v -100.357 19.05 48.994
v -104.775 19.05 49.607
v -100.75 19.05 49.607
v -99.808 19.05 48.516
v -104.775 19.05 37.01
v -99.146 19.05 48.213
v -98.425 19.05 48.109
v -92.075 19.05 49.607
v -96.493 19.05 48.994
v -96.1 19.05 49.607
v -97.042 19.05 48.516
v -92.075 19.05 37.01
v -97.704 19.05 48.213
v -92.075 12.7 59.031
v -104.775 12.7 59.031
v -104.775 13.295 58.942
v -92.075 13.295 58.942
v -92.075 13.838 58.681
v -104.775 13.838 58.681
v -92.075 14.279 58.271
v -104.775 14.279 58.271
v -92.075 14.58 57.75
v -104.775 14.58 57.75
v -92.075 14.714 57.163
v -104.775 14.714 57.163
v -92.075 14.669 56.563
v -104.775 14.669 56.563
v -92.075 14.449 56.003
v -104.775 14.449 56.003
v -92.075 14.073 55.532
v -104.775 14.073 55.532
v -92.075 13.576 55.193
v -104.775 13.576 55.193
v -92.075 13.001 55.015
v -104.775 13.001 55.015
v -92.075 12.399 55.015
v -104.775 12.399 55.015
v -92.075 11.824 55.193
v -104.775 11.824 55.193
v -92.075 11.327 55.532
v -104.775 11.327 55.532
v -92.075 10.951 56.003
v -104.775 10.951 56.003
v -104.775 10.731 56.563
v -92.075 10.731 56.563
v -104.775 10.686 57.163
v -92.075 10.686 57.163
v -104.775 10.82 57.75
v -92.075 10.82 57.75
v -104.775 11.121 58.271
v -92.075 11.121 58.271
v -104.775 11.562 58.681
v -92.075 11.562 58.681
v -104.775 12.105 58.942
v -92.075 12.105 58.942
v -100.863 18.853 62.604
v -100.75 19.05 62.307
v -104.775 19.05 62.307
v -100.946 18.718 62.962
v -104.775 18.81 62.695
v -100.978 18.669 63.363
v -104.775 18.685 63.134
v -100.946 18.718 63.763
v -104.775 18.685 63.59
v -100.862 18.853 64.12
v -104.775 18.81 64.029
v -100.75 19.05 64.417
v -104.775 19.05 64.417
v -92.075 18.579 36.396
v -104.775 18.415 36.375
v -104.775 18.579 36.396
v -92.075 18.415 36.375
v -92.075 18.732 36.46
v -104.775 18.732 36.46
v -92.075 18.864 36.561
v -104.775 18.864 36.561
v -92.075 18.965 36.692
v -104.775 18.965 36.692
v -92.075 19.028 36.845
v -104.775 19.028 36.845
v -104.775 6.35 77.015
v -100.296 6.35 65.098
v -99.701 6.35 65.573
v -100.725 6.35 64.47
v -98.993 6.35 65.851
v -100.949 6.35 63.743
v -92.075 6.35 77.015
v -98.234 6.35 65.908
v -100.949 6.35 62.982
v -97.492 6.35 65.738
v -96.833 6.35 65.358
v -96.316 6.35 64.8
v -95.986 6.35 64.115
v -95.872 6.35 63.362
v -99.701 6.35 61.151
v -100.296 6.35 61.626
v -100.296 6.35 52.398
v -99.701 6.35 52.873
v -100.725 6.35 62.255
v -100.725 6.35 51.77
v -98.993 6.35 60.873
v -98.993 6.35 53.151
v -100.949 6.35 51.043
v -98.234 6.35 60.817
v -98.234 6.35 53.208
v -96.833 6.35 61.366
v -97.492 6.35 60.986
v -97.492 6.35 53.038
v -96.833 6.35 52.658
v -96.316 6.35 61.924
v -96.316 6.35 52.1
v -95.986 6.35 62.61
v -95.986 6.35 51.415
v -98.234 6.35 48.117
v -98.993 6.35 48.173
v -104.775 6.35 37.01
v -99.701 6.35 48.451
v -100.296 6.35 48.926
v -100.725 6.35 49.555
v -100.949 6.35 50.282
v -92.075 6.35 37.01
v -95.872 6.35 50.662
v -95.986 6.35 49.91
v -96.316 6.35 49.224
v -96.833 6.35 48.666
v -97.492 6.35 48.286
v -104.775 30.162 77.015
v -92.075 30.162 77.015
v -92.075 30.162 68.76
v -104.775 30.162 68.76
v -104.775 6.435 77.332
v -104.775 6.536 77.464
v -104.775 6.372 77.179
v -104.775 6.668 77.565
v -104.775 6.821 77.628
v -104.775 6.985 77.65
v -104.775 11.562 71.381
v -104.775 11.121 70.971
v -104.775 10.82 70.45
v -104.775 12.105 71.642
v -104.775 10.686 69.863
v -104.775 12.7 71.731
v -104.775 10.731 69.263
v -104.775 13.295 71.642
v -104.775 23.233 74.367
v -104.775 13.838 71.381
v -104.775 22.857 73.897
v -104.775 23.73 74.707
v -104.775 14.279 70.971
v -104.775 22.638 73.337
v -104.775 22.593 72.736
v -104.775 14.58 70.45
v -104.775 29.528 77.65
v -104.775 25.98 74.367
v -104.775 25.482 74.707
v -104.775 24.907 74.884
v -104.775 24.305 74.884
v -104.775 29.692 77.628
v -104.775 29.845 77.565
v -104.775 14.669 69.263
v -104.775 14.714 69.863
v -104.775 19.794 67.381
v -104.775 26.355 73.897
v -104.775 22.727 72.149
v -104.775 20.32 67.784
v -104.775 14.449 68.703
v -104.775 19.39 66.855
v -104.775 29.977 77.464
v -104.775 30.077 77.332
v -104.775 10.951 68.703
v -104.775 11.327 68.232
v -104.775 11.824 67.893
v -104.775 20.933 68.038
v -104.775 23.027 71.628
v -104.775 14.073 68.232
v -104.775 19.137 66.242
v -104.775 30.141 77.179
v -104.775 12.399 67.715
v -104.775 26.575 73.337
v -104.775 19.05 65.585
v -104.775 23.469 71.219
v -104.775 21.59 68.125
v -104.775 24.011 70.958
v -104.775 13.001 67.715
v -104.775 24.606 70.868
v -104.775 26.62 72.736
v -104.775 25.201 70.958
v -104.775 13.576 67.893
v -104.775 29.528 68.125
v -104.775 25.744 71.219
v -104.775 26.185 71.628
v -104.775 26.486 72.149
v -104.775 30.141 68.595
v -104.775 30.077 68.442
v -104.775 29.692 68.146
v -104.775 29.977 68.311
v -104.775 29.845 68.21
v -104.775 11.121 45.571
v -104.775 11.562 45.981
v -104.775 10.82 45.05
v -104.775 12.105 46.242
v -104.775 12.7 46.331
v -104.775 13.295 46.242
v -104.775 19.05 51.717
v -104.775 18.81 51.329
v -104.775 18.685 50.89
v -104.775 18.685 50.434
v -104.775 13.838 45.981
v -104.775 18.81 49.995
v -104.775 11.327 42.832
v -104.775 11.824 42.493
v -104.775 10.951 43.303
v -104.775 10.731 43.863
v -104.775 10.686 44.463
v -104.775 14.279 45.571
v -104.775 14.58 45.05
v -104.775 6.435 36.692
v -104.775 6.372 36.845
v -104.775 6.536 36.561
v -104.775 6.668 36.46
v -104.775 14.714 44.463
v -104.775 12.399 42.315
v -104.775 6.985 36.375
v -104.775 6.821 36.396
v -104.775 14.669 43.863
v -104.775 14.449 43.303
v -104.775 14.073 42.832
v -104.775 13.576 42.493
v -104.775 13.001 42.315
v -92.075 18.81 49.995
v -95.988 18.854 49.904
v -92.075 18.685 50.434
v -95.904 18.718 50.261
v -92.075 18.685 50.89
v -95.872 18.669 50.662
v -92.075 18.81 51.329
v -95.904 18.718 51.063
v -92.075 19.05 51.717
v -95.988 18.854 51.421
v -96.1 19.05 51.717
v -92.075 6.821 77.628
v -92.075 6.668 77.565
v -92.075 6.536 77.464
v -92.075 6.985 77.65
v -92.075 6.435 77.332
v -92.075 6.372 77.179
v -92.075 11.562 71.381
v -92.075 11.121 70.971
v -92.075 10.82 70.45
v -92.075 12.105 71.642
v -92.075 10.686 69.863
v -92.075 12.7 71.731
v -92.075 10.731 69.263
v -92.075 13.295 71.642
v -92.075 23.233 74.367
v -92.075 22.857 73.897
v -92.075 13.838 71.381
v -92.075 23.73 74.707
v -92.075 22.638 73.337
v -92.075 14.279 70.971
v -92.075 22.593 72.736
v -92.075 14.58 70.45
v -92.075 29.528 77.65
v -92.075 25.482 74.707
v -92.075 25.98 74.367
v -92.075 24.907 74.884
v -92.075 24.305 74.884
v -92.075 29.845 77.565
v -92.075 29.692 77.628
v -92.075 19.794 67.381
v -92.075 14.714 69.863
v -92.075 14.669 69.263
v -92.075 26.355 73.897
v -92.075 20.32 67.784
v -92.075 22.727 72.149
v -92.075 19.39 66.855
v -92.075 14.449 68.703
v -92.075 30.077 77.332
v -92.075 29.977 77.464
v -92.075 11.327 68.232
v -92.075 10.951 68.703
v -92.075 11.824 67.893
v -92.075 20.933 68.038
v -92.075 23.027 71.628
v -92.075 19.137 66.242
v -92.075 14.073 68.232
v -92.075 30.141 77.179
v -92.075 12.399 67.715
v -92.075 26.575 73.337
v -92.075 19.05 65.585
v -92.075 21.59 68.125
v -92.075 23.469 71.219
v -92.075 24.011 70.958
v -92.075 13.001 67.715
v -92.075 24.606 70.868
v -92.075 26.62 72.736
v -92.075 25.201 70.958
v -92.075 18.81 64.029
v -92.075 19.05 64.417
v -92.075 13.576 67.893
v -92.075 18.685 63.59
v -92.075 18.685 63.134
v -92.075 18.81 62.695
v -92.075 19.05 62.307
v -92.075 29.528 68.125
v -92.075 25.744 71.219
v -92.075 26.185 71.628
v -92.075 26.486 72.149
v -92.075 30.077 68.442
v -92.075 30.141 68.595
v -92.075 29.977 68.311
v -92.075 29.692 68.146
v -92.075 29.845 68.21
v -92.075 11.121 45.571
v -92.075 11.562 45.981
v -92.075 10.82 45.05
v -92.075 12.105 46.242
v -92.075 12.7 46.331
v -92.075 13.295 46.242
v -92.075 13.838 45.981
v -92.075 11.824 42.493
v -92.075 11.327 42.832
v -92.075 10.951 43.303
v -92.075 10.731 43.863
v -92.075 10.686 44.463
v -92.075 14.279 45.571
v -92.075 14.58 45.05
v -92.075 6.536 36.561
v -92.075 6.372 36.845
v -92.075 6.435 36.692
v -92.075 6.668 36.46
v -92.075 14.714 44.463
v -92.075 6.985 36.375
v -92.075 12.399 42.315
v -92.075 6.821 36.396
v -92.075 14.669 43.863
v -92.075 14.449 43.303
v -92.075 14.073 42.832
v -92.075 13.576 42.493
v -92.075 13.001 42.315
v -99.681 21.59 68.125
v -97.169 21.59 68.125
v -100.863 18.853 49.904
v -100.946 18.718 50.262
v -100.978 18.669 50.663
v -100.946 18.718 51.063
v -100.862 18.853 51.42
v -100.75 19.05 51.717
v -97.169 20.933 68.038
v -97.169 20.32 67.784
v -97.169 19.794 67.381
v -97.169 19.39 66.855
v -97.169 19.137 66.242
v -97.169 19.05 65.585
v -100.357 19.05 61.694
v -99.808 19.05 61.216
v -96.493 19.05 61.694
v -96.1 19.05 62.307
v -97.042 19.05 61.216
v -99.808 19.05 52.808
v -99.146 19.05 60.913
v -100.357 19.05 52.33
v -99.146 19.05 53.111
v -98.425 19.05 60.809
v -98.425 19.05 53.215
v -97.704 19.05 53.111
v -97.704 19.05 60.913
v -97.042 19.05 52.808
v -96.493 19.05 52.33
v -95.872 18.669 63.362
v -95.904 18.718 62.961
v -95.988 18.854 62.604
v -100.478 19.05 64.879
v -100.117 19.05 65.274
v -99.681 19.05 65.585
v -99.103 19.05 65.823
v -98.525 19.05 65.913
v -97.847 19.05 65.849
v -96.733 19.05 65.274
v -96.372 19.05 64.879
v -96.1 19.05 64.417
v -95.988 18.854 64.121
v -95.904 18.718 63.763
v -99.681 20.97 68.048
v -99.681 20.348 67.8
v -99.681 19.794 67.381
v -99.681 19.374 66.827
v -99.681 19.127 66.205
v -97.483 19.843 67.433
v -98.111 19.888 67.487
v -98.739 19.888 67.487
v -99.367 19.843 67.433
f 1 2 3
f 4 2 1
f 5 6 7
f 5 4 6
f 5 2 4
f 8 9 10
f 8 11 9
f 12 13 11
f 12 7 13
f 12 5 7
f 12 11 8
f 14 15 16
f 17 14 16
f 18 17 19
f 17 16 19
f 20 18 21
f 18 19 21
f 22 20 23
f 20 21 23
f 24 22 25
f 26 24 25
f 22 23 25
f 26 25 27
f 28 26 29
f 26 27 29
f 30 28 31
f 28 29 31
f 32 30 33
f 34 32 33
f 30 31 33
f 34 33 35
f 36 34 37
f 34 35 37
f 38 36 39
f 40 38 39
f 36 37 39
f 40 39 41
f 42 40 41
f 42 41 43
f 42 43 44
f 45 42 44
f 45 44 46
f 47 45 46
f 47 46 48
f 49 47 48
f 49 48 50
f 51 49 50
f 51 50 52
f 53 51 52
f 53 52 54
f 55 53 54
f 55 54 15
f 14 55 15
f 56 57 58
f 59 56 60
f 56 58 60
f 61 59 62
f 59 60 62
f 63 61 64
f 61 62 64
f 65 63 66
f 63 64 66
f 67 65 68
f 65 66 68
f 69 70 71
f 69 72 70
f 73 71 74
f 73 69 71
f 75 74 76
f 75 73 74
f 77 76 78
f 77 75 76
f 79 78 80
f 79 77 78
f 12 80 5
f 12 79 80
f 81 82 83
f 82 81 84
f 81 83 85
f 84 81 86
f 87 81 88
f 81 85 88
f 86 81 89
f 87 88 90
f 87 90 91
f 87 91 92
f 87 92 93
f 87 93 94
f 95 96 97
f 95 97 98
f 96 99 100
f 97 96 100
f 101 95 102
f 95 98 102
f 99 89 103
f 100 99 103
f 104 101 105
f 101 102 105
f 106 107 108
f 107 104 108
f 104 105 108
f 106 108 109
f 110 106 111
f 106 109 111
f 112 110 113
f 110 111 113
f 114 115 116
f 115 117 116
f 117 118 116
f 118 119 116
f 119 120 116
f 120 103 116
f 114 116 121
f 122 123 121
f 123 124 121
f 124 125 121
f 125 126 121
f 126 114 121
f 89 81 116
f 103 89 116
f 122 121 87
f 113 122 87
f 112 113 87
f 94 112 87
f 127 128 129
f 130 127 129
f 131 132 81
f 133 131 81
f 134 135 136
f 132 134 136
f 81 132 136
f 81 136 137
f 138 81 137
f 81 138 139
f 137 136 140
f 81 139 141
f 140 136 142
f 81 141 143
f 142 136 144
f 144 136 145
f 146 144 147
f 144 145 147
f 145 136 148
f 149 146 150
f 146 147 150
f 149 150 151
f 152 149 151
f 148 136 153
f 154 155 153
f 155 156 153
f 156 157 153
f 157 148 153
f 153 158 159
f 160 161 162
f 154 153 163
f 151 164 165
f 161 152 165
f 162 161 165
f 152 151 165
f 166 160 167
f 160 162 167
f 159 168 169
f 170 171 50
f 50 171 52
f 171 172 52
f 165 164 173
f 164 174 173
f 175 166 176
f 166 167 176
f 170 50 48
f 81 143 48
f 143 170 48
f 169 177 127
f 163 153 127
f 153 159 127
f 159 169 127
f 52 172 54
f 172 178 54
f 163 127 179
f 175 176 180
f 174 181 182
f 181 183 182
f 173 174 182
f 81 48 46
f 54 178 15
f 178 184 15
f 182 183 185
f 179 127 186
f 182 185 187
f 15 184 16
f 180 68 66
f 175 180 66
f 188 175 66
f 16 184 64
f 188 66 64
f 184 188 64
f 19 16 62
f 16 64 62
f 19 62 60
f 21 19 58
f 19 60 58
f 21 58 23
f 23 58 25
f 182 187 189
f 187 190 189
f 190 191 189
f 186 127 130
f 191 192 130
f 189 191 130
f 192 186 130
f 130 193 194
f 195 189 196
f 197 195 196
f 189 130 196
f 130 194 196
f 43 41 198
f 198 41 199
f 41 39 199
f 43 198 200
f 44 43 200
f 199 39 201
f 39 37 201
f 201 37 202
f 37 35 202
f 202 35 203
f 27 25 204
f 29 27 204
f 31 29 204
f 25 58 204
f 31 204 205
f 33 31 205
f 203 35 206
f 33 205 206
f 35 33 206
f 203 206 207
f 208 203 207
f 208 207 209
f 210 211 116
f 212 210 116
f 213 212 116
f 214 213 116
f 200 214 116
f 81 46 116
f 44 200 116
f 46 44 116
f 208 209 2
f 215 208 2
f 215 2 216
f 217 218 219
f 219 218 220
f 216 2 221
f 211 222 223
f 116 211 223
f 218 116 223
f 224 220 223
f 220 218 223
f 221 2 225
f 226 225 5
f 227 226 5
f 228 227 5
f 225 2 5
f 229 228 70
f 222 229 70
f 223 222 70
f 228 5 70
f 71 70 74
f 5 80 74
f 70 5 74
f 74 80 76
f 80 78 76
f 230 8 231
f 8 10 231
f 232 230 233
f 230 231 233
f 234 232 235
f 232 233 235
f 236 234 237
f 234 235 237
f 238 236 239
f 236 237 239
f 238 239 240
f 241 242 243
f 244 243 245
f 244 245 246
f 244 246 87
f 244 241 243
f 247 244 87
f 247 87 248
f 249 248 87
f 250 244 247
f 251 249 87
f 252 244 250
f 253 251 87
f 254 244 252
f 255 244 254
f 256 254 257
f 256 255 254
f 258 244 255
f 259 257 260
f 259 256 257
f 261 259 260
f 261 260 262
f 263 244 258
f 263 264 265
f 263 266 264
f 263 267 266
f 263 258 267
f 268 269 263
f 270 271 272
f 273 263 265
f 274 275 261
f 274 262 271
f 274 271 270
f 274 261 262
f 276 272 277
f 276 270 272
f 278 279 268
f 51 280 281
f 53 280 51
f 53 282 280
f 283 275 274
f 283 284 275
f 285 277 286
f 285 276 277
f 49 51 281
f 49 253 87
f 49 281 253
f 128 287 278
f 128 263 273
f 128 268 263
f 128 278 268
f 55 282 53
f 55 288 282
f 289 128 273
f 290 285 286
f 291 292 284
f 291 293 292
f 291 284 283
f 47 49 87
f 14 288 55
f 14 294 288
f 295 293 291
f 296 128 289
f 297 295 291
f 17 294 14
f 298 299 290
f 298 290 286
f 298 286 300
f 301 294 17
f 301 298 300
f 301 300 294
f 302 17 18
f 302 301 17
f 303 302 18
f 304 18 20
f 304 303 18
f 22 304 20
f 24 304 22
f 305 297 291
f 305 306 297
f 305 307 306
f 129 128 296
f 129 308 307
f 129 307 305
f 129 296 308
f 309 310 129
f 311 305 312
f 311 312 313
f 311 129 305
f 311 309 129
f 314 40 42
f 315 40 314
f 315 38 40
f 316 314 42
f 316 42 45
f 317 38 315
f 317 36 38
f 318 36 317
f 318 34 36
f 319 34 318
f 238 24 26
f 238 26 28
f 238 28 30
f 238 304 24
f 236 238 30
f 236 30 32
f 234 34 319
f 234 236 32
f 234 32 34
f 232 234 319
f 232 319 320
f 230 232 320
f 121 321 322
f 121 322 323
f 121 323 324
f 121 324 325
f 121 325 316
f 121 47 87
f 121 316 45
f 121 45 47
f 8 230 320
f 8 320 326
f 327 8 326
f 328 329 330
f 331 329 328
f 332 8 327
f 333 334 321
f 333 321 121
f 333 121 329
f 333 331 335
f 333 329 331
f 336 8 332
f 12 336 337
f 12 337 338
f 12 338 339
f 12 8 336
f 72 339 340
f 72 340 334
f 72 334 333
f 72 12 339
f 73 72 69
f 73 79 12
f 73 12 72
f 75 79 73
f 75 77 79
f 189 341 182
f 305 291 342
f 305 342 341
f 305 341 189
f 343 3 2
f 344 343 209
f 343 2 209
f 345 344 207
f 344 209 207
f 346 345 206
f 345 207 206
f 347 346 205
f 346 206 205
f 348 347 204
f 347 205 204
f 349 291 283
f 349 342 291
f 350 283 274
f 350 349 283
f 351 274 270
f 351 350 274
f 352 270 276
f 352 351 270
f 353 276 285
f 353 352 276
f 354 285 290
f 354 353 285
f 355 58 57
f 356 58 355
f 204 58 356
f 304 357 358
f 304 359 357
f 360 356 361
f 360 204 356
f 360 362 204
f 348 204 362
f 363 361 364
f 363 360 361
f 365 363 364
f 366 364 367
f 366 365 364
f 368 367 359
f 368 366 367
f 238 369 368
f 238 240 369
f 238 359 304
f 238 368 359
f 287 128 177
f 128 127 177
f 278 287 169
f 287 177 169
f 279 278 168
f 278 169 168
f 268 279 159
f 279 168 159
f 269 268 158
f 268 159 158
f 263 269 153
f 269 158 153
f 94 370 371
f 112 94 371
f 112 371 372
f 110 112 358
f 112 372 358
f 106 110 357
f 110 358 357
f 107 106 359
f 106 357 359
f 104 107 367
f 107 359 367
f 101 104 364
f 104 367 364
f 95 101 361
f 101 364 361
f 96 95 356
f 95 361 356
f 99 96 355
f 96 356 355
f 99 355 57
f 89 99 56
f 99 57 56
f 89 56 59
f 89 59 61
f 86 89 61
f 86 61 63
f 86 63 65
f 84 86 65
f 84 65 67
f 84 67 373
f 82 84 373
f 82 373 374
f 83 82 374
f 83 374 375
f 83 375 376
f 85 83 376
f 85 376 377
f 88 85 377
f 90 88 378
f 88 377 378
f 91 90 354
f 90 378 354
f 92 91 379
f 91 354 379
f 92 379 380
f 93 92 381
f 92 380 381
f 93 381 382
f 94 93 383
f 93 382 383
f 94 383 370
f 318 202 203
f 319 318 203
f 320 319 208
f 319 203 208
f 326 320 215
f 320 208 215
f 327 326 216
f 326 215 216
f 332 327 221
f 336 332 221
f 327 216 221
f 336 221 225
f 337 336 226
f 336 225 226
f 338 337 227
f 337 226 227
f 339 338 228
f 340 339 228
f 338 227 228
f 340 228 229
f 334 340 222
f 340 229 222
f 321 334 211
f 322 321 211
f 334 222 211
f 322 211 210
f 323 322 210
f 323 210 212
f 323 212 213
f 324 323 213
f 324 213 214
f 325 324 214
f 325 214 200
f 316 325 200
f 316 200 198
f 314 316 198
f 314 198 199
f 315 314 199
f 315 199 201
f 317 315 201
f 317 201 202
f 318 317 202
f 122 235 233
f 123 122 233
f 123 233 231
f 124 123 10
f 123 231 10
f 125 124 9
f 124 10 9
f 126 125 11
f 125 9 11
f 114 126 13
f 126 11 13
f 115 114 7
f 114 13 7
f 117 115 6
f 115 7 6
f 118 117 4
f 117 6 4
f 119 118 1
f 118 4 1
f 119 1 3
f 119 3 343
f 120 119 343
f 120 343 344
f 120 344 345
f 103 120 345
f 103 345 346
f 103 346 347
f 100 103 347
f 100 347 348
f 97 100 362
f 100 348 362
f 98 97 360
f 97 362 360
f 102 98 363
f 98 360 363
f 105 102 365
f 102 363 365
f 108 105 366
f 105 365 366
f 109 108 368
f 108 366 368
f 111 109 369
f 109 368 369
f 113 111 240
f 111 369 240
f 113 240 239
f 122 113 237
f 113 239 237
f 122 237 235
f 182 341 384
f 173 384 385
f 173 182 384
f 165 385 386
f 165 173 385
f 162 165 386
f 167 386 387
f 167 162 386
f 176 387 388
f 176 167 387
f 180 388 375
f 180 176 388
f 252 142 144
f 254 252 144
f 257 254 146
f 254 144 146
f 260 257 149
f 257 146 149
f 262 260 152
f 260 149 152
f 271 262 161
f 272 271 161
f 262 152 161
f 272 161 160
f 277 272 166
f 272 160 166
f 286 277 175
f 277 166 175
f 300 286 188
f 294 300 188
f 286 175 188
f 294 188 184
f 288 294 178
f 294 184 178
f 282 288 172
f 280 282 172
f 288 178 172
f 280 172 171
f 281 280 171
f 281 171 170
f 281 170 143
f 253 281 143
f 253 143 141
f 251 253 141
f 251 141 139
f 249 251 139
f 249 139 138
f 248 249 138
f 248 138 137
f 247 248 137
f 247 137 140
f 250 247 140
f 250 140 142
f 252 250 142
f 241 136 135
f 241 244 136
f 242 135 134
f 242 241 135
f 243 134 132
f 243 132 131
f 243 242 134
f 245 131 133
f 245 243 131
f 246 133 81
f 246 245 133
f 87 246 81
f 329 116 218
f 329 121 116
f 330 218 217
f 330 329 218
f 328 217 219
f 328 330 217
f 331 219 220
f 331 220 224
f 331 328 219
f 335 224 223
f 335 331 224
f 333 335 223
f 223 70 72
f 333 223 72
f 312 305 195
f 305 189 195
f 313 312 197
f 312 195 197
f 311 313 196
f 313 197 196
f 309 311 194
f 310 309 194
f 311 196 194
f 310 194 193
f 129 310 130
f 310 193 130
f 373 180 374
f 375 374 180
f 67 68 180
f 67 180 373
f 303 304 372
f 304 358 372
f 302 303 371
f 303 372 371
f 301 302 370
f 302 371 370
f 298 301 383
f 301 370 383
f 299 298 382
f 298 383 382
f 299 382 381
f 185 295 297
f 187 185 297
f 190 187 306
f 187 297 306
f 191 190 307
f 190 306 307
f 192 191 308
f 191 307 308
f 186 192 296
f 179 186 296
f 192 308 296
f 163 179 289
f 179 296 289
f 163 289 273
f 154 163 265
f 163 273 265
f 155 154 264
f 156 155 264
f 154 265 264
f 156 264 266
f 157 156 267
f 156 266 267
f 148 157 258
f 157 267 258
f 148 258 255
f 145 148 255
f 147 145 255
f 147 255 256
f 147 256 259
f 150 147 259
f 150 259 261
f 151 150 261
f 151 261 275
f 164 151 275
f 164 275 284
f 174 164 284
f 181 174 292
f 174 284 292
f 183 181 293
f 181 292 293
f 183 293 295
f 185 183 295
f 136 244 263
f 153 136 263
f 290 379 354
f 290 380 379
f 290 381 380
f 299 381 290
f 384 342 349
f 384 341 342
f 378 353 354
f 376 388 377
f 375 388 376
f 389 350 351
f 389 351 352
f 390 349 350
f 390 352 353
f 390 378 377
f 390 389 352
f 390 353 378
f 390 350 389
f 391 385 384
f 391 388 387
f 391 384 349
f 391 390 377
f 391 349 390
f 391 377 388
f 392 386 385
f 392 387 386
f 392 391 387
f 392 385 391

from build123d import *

# Parameters (mm, degrees)
SKETCH12_W           = 12.7
SKETCH12_H           = 41.275
SKETCH12_R           = 2.5527
BOSS_EXTRUDE5_DEPTH  = 12.7
SKETCH13_R           = 2.0193
CUT_EXTRUDE3_DEPTH   = 13.7
SKETCH107_W          = 9.525
SKETCH107_H          = 11.1125
SKETCH107_R          = 2.0193
BOSS_EXTRUDE34_DEPTH = 12.7
SKETCH112_R          = 1.651
CUT_EXTRUDE58_DEPTH  = 13.7
FILLET43_R           = 2.54
FILLET44_R           = 0.635


with BuildPart() as part:
    # Sketch12 → Boss-Extrude5 (new body)
    with BuildSketch(Plane(origin=(0, 19.05, 0), x_dir=(1, 0, 0), z_dir=(0, 1, 0))):
        with Locations((-98.425, -57.012186106)):
            Rectangle(SKETCH12_W, SKETCH12_H)
        with Locations((-98.425, -63.362186106)):
            Circle(SKETCH12_R, mode=Mode.SUBTRACT)
        with Locations((-98.425, -50.662186106)):
            Circle(SKETCH12_R, mode=Mode.SUBTRACT)
    extrude(amount=-BOSS_EXTRUDE5_DEPTH)

    # Sketch13 → Cut-Extrude3 (cut, through all)
    with BuildSketch(Plane.ZY.offset(104.775)):
        with Locations((44.312186106, 12.7)):
            Circle(SKETCH13_R)
        with Locations((57.012186106, 12.7)):
            Circle(SKETCH13_R)
        with Locations((69.712186106, 12.7)):
            Circle(SKETCH13_R)
    extrude(amount=-CUT_EXTRUDE3_DEPTH, mode=Mode.SUBTRACT)

    # Sketch107 → Boss-Extrude34 (add, through all)
    with BuildSketch(Plane(origin=(-92.075, 0, 0), x_dir=(0, 0, -1), z_dir=(1, 0, 0))):
        with Locations((-72.887186106, 24.60625)):
            Rectangle(SKETCH107_W, SKETCH107_H)
        with Locations((-72.887186106, 24.60625)):
            Circle(SKETCH107_R, mode=Mode.SUBTRACT)
    extrude(amount=-BOSS_EXTRUDE34_DEPTH)

    # Sketch112 → Cut-Extrude58 (cut, through all)
    with BuildSketch(Plane.ZY.offset(104.775)):
        with Locations((50.662186106, 20.32)):
            Circle(SKETCH112_R)
        with Locations((63.362186106, 20.32)):
            Circle(SKETCH112_R)
    extrude(amount=-CUT_EXTRUDE58_DEPTH, mode=Mode.SUBTRACT)

    # Fillet43
    fillet43_edges = [part.edges().sort_by_distance(p)[0] for p in [
        (-98.425, 19.05, 68.124686106),
    ]]
    fillet(fillet43_edges, radius=FILLET43_R)

    # Fillet44
    fillet44_edges = [part.edges().sort_by_distance(p)[0] for p in [
        (-98.425, 6.35, 36.374686106),
        (-98.425, 30.1625, 77.649686106),
        (-98.425, 30.1625, 68.124686106),
        (-98.425, 6.35, 77.649686106),
        (-98.425, 19.05, 36.374686106),
    ]]
    fillet(fillet44_edges, radius=FILLET44_R)


solid = part.part
